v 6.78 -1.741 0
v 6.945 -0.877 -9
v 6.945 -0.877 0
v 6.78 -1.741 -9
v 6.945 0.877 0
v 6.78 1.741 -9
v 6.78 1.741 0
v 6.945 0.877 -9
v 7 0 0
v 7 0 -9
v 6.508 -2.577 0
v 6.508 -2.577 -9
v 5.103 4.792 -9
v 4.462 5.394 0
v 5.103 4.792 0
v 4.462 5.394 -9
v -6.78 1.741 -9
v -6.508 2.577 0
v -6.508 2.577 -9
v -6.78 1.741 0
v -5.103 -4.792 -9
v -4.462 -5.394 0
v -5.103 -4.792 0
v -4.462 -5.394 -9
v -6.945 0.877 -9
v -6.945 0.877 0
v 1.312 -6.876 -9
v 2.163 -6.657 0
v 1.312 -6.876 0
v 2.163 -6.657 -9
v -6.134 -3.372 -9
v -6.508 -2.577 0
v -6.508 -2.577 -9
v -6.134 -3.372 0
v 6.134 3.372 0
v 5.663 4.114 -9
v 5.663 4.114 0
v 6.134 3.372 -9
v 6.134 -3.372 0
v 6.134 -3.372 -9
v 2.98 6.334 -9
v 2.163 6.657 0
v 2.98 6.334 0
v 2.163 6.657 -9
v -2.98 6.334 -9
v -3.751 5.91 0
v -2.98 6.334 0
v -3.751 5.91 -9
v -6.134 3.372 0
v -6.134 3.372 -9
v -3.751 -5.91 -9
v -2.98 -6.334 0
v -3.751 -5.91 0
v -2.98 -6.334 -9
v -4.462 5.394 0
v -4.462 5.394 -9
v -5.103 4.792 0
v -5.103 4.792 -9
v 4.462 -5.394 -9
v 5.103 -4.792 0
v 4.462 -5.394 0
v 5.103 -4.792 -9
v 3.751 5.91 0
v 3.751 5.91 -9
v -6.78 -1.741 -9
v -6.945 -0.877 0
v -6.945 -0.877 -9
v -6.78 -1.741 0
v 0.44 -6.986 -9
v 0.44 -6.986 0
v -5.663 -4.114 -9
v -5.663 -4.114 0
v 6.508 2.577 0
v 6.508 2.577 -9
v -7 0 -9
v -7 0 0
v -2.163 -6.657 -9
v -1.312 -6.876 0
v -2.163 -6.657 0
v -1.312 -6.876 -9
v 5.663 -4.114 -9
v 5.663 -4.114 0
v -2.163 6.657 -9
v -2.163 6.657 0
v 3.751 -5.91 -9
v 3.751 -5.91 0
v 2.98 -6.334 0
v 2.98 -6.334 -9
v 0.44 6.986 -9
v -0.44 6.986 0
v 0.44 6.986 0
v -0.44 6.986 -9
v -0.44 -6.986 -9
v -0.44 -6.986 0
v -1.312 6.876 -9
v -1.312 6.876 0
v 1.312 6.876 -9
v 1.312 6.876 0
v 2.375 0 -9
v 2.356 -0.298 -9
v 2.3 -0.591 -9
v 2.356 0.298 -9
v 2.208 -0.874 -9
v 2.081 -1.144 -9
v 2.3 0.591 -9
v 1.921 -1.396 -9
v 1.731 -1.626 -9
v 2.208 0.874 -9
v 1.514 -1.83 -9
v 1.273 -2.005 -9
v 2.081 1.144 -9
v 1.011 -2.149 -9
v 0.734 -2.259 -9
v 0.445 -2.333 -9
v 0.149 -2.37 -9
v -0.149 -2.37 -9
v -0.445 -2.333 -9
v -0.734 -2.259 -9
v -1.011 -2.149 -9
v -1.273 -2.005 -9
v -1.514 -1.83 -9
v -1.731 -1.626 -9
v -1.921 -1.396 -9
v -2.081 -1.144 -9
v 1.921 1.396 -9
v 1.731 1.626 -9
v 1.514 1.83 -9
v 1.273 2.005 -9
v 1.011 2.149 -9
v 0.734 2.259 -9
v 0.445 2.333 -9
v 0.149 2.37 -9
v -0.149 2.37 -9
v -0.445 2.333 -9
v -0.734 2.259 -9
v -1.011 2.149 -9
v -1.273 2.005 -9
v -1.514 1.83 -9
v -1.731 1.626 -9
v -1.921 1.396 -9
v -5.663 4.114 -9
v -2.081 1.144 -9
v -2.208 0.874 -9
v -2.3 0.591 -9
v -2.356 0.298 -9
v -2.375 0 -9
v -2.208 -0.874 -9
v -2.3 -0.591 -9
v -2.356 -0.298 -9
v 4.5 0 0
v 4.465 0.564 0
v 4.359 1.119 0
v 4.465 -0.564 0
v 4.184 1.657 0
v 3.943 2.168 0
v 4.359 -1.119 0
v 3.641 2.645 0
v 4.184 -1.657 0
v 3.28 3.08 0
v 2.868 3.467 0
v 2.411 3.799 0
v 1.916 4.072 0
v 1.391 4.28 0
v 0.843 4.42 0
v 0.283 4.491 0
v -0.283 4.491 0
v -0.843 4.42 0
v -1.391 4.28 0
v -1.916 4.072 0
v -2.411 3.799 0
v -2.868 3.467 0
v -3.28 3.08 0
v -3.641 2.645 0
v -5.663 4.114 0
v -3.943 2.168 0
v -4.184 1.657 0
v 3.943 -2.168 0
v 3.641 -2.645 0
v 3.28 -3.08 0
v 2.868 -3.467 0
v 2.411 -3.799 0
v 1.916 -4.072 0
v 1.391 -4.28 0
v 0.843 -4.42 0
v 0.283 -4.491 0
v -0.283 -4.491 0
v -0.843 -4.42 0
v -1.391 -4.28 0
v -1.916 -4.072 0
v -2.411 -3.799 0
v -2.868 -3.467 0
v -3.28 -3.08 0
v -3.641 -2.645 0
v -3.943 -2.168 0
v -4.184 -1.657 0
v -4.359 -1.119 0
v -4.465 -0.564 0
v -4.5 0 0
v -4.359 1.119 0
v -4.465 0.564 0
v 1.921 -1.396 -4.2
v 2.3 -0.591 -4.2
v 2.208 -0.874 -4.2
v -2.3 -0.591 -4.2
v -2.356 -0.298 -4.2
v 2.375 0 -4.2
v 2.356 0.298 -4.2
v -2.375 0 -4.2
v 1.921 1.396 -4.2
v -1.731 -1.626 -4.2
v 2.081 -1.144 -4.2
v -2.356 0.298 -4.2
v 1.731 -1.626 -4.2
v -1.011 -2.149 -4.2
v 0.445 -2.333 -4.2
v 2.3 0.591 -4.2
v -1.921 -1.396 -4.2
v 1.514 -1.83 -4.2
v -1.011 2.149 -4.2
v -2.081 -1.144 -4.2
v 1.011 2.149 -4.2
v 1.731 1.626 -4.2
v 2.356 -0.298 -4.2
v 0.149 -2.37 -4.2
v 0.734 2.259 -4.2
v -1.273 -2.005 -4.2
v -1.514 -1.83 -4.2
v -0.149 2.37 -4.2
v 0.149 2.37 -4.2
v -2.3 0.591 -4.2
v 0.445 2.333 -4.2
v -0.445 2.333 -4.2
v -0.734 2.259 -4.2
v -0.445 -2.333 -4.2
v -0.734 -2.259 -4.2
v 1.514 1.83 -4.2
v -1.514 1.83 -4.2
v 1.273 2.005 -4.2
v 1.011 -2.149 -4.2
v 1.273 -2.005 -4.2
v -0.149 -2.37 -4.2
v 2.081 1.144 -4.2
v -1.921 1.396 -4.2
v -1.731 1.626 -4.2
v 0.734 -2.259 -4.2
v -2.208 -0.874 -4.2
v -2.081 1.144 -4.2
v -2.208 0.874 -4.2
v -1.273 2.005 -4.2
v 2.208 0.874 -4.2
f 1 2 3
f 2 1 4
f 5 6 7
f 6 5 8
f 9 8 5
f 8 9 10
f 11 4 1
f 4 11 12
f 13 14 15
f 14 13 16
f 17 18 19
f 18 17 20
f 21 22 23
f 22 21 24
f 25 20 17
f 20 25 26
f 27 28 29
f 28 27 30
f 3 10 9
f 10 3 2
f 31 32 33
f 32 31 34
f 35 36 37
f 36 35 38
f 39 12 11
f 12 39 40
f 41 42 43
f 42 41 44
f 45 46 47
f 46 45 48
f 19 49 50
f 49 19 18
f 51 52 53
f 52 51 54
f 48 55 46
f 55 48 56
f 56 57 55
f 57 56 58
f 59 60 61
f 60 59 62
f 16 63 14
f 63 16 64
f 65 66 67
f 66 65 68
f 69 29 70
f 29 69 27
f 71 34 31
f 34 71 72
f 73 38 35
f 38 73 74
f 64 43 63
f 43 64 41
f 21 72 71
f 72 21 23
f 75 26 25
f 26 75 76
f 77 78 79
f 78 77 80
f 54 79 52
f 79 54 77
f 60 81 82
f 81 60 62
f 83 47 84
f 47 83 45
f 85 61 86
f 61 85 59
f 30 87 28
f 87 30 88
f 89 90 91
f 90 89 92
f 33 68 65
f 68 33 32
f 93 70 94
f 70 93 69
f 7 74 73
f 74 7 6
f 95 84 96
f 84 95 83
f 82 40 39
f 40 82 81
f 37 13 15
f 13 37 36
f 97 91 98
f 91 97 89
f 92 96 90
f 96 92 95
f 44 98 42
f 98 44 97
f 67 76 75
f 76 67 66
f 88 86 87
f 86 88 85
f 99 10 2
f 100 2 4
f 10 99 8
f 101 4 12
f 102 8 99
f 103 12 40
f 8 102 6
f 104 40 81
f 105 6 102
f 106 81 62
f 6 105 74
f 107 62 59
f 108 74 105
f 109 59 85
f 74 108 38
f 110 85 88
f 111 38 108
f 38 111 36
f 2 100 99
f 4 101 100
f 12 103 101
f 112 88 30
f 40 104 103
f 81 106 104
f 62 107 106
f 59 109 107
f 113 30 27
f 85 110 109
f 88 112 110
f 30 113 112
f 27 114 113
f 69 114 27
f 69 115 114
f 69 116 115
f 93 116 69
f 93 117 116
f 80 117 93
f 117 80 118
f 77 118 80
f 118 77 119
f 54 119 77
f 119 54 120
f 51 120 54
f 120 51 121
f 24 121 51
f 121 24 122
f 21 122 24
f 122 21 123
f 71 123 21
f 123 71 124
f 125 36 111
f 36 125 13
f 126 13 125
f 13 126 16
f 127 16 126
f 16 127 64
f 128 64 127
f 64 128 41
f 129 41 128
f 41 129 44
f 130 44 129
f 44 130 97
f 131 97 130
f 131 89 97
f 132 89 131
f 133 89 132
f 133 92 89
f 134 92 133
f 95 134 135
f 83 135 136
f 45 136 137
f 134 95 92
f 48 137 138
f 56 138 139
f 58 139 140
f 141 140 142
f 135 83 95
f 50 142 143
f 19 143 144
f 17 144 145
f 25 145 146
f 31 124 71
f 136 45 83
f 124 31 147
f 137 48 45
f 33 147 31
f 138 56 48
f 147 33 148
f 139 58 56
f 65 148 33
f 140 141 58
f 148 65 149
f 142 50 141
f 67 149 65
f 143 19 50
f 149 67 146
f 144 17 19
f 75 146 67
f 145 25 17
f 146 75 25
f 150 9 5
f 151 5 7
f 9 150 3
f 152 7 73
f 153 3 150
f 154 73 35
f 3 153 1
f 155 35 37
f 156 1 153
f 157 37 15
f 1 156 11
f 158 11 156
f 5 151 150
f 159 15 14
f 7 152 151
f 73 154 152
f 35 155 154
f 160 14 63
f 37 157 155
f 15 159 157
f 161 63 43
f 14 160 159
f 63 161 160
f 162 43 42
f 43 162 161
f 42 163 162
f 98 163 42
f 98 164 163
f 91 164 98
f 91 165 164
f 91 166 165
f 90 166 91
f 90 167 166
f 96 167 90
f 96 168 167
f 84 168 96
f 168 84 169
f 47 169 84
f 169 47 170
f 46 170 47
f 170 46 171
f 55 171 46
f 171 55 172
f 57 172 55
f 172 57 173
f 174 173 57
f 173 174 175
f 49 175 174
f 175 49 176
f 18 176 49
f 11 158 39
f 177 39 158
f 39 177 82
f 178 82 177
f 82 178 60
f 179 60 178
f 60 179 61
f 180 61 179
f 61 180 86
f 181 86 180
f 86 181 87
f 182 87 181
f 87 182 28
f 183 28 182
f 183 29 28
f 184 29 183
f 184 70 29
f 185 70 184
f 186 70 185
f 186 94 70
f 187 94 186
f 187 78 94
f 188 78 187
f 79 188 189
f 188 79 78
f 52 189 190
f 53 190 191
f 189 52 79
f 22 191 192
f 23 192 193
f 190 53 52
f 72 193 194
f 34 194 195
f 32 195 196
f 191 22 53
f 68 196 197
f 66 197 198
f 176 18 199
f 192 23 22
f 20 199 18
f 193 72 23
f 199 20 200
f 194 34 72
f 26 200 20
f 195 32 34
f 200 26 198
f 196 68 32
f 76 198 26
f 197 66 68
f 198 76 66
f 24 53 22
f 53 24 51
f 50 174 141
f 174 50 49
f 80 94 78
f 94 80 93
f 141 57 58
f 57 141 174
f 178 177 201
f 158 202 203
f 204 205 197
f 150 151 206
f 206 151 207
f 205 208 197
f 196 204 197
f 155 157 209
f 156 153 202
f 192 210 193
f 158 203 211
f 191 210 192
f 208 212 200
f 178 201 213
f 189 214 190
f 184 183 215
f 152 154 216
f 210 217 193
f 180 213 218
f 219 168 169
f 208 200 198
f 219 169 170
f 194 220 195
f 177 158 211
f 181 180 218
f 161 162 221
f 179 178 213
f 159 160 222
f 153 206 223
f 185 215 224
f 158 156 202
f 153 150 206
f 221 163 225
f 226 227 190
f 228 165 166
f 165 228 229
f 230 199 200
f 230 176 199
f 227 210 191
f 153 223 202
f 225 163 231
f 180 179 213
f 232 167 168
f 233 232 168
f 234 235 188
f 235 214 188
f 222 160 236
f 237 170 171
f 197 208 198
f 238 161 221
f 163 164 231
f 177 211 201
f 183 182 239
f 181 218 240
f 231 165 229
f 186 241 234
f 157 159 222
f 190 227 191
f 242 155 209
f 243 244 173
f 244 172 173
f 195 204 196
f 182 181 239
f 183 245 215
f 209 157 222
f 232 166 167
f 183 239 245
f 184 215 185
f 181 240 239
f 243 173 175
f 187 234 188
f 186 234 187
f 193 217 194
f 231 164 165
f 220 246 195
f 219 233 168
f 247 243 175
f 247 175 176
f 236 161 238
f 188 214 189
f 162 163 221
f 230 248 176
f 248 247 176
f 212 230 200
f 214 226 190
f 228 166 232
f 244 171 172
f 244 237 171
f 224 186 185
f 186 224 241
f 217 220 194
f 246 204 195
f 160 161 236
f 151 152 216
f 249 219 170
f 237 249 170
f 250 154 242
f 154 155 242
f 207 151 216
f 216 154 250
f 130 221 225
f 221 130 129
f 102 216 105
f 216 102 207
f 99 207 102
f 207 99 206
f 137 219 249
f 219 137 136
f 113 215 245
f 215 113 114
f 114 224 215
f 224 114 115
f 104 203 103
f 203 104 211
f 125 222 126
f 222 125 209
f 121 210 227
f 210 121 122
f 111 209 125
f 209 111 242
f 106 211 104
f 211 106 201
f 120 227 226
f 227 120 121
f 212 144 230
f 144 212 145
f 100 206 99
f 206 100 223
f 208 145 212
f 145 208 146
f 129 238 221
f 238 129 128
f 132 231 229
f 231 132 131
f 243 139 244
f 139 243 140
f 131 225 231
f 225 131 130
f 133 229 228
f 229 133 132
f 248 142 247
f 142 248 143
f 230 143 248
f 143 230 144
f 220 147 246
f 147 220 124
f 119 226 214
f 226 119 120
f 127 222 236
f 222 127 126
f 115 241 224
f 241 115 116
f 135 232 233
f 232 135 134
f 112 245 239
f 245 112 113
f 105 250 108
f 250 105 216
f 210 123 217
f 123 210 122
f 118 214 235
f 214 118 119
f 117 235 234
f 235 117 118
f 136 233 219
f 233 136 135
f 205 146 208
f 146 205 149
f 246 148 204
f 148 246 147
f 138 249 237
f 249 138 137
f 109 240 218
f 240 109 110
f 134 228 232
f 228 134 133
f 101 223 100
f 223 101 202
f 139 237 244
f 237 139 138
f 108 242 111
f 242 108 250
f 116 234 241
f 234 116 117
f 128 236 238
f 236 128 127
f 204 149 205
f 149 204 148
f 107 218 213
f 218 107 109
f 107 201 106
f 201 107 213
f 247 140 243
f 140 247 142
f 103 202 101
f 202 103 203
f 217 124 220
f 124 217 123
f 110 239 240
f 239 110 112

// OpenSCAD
$fn = 50;


difference() {
	union() {
		translate(v = [0, 0, -9.0000000000]) {
			cylinder(h = 9, r = 7.0000000000);
		}
		translate(v = [0, 0, -9.0000000000]) {
			cylinder(h = 9, r = 2.8750000000);
		}
	}
	union() {
		translate(v = [0, 0, 0]) {
			rotate(a = [0, 0, 0]) {
				difference() {
					union() {
						#translate(v = [0, 0, -9.0000000000]) {
							cylinder(h = 9, r = 2.2500000000);
						}
						#translate(v = [0, 0, -4.2000000000]) {
							cylinder(h = 4.2000000000, r1 = 2.3750000000, r2 = 4.5000000000);
						}
						#translate(v = [0, 0, -9.0000000000]) {
							cylinder(h = 9, r = 2.3750000000);
						}
						#translate(v = [0, 0, -9.0000000000]) {
							cylinder(h = 9, r = 2.2500000000);
						}
					}
					union();
				}
			}
		}
	}
}
